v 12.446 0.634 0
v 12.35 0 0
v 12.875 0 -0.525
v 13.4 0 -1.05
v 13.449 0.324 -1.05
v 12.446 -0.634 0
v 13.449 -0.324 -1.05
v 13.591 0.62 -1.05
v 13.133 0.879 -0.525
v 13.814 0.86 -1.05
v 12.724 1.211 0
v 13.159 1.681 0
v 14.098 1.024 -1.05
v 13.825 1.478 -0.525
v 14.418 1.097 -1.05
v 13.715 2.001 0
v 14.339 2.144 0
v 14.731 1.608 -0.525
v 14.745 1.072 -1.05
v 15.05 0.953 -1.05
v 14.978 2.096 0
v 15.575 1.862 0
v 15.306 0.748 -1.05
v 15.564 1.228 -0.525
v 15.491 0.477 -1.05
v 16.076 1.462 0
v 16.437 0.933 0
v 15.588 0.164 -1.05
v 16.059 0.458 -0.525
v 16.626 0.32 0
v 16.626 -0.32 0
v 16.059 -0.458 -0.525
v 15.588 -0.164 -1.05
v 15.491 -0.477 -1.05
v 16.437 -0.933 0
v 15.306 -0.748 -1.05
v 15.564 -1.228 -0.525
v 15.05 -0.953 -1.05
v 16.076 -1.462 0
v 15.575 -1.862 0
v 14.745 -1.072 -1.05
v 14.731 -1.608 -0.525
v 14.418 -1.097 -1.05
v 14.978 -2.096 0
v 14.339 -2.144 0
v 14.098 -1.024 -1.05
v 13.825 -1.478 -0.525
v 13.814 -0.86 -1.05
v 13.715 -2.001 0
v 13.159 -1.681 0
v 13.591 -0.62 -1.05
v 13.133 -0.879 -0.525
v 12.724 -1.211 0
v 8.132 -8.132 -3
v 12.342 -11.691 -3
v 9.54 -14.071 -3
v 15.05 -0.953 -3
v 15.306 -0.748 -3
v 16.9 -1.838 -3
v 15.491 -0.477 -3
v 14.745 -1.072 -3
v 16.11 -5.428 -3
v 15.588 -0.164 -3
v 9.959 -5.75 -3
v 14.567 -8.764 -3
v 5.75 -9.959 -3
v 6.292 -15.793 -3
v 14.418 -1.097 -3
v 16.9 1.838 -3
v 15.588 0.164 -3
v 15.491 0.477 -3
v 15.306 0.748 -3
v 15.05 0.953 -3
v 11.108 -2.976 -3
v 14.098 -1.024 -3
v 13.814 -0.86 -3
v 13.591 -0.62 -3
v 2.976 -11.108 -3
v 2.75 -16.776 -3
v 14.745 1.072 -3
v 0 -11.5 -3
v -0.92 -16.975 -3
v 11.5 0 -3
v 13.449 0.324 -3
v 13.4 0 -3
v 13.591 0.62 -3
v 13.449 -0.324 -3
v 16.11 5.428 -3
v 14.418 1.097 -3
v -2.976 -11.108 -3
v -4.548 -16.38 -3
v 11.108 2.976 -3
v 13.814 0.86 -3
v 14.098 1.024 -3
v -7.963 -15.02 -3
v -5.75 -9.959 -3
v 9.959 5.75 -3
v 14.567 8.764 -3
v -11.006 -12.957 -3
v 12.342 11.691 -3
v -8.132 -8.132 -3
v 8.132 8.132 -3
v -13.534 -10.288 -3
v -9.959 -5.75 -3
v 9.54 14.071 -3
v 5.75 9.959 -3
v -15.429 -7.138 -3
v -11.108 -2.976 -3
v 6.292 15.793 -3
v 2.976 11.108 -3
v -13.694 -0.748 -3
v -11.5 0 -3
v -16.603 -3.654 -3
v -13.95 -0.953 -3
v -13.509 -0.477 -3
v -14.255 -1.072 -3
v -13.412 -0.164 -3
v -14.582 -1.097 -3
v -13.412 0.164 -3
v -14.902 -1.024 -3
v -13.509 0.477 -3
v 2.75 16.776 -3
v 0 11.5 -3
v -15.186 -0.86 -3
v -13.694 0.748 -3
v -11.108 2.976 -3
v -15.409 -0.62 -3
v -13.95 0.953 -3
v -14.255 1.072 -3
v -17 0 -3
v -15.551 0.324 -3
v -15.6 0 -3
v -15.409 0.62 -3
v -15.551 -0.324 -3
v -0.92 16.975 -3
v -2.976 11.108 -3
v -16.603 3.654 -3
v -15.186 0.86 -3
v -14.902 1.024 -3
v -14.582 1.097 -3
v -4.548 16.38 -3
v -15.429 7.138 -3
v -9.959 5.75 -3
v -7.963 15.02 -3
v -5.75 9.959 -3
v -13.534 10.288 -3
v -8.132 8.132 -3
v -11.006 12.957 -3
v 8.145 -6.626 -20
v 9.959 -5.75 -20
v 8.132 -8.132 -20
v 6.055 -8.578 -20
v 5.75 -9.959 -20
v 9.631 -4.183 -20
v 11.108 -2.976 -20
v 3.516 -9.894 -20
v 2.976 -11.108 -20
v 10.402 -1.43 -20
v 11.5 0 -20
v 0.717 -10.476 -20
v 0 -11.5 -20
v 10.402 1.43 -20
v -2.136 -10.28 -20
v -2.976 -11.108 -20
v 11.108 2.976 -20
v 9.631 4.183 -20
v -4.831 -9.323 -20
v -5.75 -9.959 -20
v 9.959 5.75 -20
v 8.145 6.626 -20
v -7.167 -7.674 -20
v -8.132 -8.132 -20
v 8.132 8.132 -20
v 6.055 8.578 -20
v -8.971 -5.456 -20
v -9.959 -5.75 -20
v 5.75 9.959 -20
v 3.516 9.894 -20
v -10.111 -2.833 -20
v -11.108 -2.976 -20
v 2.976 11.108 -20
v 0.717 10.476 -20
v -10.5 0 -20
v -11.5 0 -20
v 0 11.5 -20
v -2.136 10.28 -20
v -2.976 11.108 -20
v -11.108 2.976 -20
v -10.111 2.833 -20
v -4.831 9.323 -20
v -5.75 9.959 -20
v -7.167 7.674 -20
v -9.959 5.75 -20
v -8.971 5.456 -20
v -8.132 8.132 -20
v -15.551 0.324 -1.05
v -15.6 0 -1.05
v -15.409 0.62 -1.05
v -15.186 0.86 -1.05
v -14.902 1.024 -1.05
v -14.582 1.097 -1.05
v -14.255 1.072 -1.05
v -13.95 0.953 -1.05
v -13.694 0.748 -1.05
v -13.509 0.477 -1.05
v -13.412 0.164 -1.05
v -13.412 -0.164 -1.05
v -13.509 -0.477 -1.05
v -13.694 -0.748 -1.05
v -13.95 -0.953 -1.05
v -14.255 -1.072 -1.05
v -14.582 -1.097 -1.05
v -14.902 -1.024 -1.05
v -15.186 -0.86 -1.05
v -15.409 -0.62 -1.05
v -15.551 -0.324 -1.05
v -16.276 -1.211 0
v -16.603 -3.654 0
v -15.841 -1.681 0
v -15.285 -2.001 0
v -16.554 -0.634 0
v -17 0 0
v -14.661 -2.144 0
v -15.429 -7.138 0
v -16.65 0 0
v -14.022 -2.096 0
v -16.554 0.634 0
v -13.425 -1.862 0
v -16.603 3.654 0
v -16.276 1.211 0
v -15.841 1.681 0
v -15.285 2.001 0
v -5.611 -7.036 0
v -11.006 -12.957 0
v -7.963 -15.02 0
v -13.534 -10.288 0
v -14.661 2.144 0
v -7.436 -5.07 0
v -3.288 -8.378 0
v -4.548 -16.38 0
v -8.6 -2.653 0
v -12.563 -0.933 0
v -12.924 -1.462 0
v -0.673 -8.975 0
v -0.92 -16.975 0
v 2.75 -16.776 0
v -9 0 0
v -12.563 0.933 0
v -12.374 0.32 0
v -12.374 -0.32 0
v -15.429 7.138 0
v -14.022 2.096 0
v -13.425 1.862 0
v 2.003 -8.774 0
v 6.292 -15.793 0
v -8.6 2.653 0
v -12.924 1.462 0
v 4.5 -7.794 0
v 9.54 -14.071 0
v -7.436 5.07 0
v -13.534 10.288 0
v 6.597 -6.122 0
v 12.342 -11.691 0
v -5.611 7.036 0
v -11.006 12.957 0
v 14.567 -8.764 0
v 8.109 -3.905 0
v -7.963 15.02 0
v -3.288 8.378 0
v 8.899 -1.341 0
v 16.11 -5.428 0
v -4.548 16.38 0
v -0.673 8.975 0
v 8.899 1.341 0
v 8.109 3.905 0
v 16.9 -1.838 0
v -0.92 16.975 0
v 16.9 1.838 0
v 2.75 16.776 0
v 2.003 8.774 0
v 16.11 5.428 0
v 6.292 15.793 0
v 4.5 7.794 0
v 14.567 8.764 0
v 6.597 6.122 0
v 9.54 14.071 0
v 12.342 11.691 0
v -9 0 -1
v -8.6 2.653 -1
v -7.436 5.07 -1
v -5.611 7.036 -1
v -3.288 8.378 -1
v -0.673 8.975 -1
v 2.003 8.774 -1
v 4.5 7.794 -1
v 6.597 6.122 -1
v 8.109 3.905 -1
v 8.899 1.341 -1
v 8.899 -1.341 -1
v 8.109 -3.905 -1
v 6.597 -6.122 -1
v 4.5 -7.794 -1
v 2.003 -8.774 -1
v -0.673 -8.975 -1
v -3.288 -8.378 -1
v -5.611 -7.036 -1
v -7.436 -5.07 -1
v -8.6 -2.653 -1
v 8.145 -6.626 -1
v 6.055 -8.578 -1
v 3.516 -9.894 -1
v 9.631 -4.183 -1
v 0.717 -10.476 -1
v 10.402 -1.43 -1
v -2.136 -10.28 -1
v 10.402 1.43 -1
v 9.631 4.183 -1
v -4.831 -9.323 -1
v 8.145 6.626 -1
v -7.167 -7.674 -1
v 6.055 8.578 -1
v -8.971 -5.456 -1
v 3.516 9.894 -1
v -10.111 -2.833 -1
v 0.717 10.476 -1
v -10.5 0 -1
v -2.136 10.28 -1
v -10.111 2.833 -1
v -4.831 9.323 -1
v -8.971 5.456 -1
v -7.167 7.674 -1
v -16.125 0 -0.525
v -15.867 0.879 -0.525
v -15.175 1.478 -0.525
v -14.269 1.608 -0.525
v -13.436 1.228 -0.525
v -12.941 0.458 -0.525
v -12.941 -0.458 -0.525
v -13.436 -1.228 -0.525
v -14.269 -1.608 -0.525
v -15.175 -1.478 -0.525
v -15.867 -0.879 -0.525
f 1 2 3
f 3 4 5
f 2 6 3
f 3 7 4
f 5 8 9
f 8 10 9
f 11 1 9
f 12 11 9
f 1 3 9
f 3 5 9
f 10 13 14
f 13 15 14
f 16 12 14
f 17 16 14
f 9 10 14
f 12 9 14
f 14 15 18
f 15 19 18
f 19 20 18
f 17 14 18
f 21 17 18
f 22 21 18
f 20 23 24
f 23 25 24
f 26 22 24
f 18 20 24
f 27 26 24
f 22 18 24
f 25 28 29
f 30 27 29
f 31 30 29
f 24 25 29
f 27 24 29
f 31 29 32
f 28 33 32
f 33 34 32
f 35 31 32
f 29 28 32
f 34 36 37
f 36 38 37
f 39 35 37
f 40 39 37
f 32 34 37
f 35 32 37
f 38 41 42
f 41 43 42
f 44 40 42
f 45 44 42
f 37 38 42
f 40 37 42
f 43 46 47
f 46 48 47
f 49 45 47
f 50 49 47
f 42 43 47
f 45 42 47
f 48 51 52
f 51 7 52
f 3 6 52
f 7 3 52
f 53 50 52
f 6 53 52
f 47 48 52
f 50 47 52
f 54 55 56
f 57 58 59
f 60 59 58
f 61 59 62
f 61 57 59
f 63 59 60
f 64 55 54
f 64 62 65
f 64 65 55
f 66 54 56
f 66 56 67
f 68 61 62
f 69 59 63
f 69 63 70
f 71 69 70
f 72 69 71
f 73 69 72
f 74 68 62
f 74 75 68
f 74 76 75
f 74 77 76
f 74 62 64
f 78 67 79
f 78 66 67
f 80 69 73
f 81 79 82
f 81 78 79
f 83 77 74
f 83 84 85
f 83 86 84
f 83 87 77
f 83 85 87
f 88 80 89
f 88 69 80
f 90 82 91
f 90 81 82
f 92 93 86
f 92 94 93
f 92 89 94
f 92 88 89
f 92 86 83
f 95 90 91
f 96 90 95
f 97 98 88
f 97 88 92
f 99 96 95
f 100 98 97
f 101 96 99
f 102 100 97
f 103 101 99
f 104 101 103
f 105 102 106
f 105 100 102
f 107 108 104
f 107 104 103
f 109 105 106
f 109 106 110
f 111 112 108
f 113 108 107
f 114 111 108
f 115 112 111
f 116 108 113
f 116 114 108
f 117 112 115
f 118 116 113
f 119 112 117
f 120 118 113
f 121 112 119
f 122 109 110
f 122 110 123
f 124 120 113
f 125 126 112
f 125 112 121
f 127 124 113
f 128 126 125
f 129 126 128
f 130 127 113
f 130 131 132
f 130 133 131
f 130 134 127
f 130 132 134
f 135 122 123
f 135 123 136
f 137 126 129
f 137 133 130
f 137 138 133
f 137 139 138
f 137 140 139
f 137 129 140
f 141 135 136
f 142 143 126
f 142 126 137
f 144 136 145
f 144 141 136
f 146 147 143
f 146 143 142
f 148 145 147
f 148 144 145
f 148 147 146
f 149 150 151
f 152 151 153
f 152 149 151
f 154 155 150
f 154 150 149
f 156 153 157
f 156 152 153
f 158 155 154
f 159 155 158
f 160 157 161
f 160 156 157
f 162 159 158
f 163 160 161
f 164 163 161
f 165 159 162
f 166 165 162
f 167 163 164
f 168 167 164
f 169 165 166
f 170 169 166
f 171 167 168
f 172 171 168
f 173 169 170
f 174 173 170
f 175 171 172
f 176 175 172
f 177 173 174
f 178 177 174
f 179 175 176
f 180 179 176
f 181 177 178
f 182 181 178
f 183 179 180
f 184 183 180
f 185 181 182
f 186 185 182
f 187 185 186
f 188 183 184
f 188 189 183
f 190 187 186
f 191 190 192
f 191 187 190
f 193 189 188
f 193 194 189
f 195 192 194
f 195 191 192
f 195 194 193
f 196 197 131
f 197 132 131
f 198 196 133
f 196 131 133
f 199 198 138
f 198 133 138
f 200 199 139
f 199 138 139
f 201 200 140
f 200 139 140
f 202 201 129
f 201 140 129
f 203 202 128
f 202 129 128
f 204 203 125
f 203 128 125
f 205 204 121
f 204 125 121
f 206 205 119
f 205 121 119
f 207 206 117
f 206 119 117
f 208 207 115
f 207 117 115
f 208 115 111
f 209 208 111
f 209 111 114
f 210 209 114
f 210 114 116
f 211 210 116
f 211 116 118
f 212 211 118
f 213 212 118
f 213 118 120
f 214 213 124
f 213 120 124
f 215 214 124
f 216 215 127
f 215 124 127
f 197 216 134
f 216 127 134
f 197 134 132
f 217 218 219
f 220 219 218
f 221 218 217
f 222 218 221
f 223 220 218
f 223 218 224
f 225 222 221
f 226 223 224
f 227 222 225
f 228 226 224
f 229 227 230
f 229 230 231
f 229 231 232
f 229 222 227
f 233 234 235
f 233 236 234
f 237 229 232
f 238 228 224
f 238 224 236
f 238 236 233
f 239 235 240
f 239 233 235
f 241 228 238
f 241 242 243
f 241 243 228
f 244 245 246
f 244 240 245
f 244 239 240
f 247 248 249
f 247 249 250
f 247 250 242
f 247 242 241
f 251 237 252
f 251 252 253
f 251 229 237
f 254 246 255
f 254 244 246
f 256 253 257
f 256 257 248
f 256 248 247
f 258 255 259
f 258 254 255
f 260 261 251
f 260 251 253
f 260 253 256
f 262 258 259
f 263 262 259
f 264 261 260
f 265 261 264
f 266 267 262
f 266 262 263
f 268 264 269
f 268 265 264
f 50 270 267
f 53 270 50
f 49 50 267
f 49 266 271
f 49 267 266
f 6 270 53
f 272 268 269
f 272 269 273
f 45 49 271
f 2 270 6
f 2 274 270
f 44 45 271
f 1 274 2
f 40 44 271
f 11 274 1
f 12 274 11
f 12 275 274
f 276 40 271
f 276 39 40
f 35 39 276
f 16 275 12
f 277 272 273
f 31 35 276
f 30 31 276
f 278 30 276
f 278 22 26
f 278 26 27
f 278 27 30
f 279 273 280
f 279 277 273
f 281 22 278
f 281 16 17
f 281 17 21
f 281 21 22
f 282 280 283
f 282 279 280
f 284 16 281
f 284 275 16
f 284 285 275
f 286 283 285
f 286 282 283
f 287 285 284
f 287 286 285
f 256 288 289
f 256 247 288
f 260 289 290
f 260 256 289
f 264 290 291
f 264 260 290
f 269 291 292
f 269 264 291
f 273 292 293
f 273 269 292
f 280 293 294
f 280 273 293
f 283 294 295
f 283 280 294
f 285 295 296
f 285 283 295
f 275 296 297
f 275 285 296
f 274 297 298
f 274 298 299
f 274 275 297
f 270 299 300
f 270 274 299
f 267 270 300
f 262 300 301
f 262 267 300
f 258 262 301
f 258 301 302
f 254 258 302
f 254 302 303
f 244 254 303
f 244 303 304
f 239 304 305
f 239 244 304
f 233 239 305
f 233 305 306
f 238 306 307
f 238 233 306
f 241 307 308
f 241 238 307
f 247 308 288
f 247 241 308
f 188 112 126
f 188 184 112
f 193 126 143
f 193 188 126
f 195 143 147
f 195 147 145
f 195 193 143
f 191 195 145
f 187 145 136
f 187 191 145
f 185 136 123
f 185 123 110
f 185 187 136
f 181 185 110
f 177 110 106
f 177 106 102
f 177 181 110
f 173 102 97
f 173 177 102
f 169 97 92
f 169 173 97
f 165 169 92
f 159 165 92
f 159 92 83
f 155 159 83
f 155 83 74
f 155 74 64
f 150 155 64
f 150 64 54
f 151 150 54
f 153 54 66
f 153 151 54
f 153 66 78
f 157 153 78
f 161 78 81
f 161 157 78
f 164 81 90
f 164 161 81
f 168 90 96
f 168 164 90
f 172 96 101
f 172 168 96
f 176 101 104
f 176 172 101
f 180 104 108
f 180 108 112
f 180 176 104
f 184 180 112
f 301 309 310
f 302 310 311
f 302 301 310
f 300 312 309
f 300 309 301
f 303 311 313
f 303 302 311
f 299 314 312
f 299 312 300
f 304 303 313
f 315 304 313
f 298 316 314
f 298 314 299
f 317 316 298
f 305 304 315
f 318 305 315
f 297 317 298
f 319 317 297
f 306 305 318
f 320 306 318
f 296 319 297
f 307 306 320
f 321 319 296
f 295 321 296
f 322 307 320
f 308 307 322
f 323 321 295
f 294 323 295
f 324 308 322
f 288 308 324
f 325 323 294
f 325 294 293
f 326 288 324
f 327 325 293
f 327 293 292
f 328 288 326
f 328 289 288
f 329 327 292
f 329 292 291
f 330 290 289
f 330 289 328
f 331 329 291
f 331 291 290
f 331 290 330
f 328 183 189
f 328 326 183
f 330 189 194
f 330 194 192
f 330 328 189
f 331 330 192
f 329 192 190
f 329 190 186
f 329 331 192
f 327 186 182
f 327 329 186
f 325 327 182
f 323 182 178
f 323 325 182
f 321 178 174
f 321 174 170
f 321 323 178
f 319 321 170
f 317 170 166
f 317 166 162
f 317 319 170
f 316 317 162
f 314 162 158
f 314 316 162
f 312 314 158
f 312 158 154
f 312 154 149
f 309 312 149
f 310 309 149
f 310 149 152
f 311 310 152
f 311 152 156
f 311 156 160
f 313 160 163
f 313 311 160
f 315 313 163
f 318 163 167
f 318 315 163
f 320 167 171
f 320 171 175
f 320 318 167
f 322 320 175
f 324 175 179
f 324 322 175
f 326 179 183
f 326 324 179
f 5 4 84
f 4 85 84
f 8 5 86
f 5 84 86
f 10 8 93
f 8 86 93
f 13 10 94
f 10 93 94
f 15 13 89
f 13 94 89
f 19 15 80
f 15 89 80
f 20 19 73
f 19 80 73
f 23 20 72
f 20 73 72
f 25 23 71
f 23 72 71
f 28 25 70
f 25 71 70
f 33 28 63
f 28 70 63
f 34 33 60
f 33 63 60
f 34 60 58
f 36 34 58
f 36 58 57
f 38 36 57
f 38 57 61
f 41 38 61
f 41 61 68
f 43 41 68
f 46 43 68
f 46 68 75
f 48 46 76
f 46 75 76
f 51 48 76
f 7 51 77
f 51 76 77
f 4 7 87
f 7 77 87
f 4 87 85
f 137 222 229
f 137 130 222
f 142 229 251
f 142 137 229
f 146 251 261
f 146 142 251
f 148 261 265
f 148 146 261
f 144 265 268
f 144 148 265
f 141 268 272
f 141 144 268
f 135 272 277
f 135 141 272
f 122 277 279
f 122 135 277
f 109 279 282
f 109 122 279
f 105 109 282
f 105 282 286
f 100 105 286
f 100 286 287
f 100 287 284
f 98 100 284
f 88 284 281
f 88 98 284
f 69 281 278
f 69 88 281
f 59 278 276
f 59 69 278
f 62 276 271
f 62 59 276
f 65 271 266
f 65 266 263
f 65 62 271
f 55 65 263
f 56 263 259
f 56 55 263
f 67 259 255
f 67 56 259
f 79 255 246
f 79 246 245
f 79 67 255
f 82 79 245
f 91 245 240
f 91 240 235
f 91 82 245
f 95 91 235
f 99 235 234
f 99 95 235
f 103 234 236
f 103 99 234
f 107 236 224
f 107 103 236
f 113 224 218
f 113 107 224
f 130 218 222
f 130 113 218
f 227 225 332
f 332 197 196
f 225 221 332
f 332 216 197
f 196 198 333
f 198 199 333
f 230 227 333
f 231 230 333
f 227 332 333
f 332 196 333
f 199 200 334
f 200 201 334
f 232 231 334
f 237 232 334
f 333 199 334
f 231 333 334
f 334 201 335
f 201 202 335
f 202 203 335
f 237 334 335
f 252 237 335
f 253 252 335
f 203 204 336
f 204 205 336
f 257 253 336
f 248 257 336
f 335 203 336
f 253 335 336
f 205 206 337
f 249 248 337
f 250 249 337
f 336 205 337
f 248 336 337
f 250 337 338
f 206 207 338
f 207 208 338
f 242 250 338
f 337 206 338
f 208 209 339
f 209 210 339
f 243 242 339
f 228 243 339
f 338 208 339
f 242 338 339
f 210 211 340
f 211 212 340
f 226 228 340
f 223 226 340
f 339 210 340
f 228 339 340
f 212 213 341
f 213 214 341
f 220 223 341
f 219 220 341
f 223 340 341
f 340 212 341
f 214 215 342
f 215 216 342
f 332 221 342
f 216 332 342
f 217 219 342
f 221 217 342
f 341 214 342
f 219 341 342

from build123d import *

# Parameters (mm, degrees)
F3_D           = 2.2
F3_CSINK_D     = 4.3
F3_CSINK_ANGLE = 90


with BuildPart() as f1:
    # F0 (on Front) → F1 (revolve)
    with BuildSketch(Plane.XZ):
        Polygon((-9, -1), (-9, 0), (-17, 0), (-17, -3), (-11.5, -3), (-11.5, -20), (-10.5, -20), (-10.5, -1), align=None)
    revolve(axis=Axis((0, 0, -20.998121), (0, 0, -1)))

    # F3 (through all)
    with Locations(Plane.XY):
        with Locations((-14.5, 0), (14.5, 0)):
            CounterSinkHole(F3_D / 2, F3_CSINK_D / 2, counter_sink_angle=F3_CSINK_ANGLE)


solid = f1.part
